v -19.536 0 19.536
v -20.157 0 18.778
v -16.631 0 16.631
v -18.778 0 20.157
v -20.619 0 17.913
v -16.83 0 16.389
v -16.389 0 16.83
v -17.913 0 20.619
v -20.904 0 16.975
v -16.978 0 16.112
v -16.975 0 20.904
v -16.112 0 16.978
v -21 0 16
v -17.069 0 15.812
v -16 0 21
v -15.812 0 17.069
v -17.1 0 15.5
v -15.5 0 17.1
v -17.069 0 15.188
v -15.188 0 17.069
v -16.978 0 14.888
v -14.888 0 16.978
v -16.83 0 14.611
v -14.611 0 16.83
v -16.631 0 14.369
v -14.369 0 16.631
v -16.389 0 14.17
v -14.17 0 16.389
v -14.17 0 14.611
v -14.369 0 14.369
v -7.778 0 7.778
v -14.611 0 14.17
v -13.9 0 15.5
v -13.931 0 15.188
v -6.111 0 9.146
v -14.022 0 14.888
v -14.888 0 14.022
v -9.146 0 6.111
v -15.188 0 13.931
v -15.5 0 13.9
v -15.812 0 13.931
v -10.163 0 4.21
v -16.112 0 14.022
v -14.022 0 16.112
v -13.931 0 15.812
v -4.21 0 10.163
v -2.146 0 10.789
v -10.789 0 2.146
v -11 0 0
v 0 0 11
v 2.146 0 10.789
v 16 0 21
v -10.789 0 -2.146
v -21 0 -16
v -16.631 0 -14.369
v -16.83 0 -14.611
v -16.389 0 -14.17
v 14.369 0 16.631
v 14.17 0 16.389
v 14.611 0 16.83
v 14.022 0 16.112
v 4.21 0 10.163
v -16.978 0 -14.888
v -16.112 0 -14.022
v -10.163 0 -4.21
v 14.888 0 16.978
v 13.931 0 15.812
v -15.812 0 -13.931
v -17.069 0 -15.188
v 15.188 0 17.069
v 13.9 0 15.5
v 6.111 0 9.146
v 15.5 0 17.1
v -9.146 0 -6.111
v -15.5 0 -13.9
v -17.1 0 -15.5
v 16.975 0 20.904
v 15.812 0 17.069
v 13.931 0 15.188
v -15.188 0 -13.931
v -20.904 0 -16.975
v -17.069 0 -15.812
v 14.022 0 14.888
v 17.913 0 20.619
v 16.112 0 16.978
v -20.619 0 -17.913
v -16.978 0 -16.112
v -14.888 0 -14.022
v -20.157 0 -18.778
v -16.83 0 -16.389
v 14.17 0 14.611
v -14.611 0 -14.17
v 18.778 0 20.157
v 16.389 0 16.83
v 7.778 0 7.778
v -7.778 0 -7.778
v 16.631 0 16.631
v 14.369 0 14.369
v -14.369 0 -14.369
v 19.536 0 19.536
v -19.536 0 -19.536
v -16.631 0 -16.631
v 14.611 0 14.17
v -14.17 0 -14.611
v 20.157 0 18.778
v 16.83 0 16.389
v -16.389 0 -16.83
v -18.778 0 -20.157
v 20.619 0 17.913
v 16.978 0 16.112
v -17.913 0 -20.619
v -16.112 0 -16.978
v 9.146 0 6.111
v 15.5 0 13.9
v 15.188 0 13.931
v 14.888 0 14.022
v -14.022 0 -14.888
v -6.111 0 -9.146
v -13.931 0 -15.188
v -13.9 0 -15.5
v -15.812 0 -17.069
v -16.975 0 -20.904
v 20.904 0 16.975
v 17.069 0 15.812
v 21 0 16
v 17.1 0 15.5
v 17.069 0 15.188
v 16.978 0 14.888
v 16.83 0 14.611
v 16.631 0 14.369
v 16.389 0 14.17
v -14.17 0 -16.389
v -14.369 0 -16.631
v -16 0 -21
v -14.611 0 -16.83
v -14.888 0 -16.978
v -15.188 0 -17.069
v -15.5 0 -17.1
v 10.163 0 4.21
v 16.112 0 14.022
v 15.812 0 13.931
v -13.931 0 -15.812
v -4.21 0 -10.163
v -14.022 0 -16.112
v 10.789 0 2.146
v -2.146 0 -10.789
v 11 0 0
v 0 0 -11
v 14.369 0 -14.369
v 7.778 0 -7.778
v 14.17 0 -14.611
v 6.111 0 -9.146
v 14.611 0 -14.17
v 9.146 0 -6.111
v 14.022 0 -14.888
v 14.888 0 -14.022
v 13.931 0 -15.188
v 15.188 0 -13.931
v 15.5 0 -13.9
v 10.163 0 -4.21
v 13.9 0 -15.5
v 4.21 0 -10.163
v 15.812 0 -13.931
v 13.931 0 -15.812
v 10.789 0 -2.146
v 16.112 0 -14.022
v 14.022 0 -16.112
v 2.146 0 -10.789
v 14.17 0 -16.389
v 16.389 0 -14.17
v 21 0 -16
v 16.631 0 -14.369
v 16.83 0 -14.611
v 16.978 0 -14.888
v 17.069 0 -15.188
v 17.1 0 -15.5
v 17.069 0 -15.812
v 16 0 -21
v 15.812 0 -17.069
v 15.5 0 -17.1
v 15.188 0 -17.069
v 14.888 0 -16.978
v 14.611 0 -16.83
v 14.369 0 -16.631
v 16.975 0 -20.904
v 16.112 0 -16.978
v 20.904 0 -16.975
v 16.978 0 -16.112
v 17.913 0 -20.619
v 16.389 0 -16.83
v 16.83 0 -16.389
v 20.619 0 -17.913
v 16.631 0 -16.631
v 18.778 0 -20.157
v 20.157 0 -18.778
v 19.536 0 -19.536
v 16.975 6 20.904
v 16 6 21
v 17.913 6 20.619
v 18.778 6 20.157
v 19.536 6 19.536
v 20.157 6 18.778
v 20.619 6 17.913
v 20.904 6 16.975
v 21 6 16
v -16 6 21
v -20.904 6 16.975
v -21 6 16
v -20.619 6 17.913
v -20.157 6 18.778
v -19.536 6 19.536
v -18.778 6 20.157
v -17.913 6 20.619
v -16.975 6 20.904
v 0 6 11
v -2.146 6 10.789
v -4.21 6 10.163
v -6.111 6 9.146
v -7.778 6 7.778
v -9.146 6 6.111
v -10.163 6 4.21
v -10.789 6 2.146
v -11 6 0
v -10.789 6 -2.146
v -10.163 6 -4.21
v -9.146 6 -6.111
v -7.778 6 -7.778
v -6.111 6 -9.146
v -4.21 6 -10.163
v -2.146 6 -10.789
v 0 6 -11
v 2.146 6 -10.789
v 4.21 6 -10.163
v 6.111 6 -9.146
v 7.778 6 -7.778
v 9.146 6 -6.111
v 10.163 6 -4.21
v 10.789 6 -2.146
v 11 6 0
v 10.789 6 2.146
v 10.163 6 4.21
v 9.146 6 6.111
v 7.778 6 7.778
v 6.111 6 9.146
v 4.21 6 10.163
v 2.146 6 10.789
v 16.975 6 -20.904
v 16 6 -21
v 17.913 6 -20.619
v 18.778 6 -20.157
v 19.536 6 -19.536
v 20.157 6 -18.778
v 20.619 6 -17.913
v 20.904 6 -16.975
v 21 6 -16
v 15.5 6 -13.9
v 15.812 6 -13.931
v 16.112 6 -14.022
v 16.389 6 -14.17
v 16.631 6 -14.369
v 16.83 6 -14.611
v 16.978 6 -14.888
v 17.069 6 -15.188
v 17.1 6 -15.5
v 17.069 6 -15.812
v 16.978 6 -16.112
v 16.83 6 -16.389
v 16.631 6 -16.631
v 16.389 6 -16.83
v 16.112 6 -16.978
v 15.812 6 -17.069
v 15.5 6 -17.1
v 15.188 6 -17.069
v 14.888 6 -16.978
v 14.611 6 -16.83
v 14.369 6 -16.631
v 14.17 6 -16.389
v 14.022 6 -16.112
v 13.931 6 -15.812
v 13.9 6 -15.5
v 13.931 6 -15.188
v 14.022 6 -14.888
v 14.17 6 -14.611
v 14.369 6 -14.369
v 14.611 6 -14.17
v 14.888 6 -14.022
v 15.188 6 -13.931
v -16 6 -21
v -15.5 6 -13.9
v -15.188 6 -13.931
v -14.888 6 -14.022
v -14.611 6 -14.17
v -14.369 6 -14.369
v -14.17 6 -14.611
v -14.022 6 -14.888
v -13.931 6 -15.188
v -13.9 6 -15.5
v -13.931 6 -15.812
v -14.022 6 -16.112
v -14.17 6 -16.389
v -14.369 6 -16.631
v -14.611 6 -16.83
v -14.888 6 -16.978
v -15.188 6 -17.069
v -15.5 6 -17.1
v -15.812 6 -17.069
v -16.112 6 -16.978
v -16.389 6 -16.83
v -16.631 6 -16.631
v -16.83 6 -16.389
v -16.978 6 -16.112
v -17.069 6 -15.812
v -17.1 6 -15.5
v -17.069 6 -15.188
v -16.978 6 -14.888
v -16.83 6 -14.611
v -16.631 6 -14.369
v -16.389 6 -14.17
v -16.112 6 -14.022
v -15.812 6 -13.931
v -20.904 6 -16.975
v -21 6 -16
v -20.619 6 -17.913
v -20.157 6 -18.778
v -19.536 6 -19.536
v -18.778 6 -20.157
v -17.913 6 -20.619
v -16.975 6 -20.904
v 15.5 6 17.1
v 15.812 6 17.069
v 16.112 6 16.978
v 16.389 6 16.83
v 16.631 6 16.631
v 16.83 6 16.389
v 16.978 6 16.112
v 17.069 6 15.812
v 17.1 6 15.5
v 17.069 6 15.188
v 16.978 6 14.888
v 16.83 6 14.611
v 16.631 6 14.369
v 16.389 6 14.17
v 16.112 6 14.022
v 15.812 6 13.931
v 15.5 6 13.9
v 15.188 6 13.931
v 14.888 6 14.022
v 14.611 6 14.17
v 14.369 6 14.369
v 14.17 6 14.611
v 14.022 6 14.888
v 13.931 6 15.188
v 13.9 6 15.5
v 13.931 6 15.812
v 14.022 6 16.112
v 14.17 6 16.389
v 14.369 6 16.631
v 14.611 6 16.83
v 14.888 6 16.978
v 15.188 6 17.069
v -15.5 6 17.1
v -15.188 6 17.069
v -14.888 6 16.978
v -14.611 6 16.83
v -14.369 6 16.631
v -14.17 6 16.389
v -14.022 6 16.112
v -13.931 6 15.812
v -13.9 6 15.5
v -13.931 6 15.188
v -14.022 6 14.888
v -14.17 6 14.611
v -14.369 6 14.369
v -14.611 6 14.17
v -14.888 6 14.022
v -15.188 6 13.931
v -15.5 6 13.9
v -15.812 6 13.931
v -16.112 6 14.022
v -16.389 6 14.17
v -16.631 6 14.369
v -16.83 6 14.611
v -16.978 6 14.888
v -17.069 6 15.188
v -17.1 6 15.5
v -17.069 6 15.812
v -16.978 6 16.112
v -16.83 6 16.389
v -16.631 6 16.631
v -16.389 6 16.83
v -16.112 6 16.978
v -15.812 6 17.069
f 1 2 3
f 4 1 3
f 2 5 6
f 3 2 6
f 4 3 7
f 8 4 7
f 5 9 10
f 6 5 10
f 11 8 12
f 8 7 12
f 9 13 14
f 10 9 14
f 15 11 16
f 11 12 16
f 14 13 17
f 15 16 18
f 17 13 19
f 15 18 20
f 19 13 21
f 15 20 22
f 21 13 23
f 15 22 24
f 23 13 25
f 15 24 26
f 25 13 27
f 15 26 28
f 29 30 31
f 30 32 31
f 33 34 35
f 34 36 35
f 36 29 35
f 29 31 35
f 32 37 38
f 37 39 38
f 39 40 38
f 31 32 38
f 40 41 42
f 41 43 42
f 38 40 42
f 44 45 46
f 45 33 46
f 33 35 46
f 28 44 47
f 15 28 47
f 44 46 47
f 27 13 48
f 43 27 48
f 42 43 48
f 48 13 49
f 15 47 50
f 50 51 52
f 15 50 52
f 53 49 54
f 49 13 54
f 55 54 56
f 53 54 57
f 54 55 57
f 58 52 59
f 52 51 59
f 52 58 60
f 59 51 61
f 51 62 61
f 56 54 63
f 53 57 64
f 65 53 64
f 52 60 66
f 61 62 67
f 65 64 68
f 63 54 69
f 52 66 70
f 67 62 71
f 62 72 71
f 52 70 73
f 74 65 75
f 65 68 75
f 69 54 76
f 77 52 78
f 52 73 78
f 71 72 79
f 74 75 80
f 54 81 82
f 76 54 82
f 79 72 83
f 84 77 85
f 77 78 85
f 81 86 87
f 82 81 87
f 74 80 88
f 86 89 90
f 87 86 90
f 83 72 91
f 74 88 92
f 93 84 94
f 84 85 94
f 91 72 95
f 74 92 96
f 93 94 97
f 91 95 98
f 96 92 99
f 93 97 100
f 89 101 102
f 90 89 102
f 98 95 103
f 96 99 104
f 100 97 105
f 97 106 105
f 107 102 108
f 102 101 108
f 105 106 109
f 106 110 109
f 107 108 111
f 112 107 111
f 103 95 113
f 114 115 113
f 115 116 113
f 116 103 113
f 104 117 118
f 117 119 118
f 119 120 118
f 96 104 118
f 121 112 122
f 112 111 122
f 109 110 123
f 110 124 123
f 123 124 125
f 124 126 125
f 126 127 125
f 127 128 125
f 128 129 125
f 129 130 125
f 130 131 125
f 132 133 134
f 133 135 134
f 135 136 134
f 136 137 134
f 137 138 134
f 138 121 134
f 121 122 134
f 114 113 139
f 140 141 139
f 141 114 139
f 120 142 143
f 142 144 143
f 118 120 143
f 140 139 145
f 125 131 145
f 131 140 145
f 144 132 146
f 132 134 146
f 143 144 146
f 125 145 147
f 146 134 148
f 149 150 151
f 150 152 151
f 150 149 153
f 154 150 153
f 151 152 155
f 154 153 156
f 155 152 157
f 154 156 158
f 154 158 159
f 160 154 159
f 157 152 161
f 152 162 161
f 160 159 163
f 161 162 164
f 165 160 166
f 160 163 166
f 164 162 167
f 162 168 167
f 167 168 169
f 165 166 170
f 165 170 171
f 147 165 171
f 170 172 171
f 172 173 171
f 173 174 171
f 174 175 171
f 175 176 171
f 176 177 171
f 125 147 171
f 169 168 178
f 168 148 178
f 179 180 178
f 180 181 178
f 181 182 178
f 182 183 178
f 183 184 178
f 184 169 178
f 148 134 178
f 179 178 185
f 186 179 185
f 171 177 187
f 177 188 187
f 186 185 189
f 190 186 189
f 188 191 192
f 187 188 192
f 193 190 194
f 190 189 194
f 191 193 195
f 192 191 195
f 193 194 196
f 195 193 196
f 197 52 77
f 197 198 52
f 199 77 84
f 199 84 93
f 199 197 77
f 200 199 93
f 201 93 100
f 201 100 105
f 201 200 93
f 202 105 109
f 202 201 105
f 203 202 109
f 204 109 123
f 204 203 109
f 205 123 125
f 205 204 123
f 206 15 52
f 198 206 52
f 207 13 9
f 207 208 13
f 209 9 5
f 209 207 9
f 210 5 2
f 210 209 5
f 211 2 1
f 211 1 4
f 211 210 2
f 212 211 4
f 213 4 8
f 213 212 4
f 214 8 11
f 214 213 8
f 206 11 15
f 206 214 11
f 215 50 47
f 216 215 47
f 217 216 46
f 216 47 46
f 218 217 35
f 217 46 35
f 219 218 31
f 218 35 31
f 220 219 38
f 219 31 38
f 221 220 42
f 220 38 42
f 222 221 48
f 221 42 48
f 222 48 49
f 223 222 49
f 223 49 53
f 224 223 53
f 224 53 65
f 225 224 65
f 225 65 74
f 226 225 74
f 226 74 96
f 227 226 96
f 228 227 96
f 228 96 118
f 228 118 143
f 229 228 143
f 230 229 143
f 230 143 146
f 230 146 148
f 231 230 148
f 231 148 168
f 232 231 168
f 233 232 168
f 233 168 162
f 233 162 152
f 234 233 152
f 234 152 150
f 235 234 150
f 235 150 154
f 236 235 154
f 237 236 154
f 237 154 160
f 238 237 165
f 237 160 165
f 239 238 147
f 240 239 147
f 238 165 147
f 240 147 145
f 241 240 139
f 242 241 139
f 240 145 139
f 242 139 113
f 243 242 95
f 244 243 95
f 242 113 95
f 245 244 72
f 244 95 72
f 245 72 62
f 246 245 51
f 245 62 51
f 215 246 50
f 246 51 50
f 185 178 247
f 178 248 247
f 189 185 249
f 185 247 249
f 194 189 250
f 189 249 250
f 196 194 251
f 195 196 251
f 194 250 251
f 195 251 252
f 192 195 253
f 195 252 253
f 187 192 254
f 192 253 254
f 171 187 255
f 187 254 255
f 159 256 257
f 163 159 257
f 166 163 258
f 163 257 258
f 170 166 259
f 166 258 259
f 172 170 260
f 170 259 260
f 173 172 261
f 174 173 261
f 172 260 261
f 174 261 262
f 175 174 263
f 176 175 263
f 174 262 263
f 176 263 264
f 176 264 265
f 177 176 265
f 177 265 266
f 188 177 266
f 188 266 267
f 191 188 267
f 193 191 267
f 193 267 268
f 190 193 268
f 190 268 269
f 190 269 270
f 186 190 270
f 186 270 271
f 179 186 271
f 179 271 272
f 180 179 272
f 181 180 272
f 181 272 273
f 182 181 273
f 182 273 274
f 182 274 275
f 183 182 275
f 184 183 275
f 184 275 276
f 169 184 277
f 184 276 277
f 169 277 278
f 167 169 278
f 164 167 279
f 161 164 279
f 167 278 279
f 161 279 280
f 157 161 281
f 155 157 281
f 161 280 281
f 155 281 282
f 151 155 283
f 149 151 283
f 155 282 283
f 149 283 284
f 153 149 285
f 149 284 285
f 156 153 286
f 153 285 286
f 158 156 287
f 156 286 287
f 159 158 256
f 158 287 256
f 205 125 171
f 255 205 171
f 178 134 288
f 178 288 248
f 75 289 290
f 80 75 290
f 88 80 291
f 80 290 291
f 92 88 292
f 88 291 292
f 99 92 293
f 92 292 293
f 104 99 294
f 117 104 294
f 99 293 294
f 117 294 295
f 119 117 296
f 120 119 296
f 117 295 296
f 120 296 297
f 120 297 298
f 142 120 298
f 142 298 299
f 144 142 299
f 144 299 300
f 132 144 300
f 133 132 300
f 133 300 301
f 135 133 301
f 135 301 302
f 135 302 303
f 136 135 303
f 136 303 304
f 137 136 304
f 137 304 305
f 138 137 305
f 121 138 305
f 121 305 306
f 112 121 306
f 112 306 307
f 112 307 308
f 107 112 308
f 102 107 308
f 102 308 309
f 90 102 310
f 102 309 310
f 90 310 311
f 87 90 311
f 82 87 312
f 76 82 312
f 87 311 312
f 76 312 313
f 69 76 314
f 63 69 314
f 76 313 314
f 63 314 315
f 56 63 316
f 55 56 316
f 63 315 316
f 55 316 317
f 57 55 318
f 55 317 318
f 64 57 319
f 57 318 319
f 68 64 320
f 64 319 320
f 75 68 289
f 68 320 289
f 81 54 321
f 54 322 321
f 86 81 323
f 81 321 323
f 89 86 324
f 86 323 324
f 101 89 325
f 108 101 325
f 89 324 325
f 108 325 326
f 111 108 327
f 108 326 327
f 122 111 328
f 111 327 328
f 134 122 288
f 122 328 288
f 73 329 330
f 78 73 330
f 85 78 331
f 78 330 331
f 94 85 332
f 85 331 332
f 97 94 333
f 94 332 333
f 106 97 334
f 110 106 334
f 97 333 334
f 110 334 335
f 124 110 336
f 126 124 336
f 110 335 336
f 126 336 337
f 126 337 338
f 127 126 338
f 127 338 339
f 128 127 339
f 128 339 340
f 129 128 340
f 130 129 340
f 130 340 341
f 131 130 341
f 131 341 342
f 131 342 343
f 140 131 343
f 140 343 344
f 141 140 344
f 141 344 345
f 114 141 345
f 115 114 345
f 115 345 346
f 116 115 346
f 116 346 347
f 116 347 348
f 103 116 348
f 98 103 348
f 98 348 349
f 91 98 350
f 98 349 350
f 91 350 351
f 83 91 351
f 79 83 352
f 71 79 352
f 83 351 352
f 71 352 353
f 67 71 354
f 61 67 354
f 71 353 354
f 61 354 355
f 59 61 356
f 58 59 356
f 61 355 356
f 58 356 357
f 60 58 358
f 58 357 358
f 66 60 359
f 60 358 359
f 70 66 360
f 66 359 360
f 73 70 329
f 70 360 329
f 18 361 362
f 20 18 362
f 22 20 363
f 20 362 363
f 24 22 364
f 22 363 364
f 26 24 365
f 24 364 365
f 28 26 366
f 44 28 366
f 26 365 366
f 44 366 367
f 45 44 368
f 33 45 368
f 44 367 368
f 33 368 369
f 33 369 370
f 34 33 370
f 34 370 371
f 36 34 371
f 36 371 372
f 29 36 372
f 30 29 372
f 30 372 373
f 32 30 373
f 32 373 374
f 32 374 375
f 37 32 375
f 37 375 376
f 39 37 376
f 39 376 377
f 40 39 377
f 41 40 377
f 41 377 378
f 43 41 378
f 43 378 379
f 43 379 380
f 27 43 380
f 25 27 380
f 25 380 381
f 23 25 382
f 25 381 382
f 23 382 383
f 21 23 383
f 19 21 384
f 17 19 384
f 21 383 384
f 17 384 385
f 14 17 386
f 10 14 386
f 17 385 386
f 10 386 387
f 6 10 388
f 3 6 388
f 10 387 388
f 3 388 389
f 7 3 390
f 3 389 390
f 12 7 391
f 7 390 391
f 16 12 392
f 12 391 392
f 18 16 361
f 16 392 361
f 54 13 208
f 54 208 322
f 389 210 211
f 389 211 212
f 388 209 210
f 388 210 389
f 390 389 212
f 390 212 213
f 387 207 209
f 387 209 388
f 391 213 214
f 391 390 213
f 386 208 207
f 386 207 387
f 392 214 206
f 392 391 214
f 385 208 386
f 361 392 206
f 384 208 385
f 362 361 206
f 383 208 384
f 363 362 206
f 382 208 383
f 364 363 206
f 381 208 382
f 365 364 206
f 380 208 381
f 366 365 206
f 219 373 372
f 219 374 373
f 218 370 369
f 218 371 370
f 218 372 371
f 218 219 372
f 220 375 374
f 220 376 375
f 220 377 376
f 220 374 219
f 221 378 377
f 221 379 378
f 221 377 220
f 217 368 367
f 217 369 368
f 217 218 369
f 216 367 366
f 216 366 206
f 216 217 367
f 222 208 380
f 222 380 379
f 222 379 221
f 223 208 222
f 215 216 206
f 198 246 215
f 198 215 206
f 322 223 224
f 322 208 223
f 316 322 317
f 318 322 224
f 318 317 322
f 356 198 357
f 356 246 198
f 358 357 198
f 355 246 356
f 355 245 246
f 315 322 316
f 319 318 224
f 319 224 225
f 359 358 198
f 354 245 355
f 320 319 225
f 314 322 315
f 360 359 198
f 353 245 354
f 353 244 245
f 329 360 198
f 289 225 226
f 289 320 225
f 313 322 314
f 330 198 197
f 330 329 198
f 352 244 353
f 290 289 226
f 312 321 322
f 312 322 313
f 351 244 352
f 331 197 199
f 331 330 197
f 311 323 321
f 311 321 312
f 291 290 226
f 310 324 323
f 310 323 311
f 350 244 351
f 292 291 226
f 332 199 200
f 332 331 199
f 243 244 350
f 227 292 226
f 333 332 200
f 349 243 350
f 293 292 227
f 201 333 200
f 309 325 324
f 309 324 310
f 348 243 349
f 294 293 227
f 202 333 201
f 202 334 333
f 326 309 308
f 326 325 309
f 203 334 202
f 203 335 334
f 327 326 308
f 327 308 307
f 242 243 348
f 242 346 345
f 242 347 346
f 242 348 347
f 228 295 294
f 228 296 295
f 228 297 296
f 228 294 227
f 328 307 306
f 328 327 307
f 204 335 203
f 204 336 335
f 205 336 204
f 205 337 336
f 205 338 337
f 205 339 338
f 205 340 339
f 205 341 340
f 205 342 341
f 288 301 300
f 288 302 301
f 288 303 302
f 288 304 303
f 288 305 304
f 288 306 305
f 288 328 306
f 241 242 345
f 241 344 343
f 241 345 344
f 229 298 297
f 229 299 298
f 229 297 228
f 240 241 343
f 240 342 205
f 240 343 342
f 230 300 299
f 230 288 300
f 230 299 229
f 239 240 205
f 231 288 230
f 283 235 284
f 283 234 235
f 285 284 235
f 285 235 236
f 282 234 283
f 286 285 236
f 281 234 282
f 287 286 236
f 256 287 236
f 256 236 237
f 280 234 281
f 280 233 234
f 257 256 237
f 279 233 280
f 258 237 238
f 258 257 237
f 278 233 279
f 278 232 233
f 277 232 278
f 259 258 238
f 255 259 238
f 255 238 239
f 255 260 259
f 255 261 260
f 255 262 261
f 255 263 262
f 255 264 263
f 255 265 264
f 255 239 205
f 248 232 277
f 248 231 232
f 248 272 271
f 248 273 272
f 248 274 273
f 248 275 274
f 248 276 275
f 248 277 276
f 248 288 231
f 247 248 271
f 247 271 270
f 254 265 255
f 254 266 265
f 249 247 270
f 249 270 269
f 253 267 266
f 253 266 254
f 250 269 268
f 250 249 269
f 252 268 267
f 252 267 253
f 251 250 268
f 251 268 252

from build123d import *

# Parameters (mm, degrees)
SKETCH1_W            = 42
SKETCH1_H            = 42
BOSS_EXTRUDE1_DEPTH  = 6
M3_CLEARANCE_HOLE1_D = 3.2
SKETCH6_R            = 11
CUT_EXTRUDE3_DEPTH   = 7
FILLET1_R            = 5


with BuildPart() as part:
    # Sketch1 → Boss-Extrude1 (new body)
    with BuildSketch(Plane(origin=(0, 0, 0), x_dir=(1, 0, 0), z_dir=(0, 1, 0))):
        Rectangle(SKETCH1_W, SKETCH1_H)
    extrude(amount=BOSS_EXTRUDE1_DEPTH)

    # M3 Clearance Hole1 (through all)
    with Locations(Plane(origin=(0, 0, 0), x_dir=(0, 0, -1), z_dir=(0, -1, 0))):
        with Locations((15.5, -15.5), (-15.5, -15.5), (-15.5, 15.5), (15.5, 15.5)):
            Hole(M3_CLEARANCE_HOLE1_D / 2)

    # Sketch6 → Cut-Extrude3 (cut, through all)
    with BuildSketch(Plane(origin=(0, 0, 0), x_dir=(0, 0, 1), z_dir=(0, -1, 0))):
        Circle(SKETCH6_R)
    extrude(amount=-CUT_EXTRUDE3_DEPTH, mode=Mode.SUBTRACT)

    # Fillet1
    fillet1_edges = [part.edges().sort_by_distance(p)[0] for p in [
        (21, 3, 21),
        (-21, 3, 21),
        (-21, 3, -21),
        (21, 3, -21),
    ]]
    fillet(fillet1_edges, radius=FILLET1_R)


solid = part.part
